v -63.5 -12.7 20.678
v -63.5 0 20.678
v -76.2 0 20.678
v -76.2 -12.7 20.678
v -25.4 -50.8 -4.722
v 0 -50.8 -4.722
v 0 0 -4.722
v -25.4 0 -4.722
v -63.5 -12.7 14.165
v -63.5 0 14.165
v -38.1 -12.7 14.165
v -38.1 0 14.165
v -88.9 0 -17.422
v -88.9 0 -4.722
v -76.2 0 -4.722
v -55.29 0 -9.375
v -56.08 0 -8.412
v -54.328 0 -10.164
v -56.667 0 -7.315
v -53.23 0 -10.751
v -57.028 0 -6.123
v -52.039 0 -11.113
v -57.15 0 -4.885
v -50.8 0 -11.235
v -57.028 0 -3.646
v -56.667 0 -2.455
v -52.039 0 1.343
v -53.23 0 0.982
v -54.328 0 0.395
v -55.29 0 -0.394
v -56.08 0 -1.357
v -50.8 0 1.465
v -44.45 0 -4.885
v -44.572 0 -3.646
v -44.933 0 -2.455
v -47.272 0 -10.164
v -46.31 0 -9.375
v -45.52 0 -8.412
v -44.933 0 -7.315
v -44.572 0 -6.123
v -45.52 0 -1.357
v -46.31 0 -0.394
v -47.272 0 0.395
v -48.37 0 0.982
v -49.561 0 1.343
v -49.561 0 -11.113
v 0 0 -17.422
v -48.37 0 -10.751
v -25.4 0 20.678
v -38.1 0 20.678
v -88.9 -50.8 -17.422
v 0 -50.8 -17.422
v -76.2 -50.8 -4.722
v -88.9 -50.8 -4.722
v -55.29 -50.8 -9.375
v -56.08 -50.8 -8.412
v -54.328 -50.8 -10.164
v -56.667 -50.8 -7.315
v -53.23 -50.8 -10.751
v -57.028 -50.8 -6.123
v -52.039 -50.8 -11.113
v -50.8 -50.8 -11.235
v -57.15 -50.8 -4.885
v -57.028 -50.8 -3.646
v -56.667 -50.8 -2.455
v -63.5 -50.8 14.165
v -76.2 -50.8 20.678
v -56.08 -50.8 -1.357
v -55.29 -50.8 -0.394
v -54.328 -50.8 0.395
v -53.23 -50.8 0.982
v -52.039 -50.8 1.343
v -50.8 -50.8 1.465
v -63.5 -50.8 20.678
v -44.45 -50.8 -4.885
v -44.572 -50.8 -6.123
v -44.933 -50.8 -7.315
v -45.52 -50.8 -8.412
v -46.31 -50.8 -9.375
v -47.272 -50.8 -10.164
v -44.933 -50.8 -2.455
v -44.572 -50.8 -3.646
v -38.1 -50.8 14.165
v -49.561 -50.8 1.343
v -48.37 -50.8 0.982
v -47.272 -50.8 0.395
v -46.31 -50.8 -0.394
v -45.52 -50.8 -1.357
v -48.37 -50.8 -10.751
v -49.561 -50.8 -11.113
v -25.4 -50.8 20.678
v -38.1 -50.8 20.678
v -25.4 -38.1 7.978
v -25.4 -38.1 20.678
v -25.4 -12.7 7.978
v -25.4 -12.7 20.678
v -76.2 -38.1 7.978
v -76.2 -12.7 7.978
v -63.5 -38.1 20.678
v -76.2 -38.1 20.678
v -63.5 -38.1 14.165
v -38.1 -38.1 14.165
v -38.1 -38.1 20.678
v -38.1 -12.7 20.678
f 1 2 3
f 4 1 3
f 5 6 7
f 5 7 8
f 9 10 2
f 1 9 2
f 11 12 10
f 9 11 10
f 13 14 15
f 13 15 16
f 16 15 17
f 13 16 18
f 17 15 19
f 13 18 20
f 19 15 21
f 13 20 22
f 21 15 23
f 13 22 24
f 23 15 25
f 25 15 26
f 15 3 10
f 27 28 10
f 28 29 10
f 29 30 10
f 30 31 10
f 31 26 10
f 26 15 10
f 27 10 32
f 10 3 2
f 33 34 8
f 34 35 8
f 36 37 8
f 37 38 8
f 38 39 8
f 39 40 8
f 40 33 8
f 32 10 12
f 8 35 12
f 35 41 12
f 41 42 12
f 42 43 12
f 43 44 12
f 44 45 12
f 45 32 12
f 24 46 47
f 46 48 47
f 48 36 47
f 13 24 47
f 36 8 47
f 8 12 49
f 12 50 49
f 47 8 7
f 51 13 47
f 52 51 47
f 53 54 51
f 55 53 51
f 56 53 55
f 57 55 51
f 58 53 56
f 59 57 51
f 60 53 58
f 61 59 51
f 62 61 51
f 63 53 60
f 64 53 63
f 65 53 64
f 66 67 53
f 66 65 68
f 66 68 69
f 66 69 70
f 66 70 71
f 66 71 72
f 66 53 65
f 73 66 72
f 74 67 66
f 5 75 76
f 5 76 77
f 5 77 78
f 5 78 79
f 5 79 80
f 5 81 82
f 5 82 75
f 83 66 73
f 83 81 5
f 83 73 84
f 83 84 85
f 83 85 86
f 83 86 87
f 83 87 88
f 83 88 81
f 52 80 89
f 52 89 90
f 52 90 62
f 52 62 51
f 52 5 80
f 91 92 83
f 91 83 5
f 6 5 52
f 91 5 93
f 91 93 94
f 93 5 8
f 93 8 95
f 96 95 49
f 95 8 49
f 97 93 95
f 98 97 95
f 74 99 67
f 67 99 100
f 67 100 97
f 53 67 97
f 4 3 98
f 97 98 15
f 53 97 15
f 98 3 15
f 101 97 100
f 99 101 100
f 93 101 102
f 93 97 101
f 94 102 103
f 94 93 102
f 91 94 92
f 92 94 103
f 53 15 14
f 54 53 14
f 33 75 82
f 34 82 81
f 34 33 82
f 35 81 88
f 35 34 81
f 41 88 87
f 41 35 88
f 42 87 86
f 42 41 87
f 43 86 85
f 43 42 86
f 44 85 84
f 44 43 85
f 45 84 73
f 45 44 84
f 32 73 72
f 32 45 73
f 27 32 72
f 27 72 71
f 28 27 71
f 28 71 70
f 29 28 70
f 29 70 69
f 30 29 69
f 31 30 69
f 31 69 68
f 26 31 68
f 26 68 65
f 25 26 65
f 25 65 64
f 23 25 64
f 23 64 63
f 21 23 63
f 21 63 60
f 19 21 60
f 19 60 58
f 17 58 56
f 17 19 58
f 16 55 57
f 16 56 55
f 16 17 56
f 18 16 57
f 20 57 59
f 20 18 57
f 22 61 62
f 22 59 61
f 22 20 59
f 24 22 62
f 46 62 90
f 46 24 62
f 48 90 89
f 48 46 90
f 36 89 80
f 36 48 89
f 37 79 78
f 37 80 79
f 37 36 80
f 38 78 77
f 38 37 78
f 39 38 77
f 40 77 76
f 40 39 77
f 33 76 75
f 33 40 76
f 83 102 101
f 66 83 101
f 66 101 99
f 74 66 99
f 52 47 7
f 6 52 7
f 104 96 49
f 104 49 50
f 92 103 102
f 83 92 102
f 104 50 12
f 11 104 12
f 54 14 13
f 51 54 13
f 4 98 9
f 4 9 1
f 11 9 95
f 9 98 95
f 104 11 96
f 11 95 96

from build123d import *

# Parameters (mm, degrees)
F1_DEPTH = 50.8
F2_R     = 6.35
F3_DEPTH = 50.801
F4_W     = 25.4
F4_H     = 12.7
F5_DEPTH = 88.901


with BuildPart() as f1:
    # F0 (on Front) → F1 (new body)
    with BuildSketch(Plane.XZ):
        Polygon((-76.2, -4.721795), (-88.9, -4.721795), (-88.9, -17.421795), (0, -17.421795), (0, -4.721795), (-25.4, -4.721795), (-25.4, 20.678205), (-38.1, 20.678205), (-38.1, 14.165386), (-63.5, 14.165386), (-63.5, 20.678205), (-76.2, 20.678205), align=None)
    extrude(amount=F1_DEPTH)

    # F2 (on Front) → F3 (cut, through all)
    with BuildSketch(Plane.XZ):
        with Locations((-50.8, -4.884614)):
            Circle(F2_R)
    extrude(amount=F3_DEPTH, mode=Mode.SUBTRACT)

    # F4 (on Right) → F5 (cut, through all)
    with BuildSketch(Plane.YZ):
        with Locations((-25.4, 14.328205)):
            Rectangle(F4_W, F4_H)
    extrude(amount=-F5_DEPTH, mode=Mode.SUBTRACT)


solid = f1.part
